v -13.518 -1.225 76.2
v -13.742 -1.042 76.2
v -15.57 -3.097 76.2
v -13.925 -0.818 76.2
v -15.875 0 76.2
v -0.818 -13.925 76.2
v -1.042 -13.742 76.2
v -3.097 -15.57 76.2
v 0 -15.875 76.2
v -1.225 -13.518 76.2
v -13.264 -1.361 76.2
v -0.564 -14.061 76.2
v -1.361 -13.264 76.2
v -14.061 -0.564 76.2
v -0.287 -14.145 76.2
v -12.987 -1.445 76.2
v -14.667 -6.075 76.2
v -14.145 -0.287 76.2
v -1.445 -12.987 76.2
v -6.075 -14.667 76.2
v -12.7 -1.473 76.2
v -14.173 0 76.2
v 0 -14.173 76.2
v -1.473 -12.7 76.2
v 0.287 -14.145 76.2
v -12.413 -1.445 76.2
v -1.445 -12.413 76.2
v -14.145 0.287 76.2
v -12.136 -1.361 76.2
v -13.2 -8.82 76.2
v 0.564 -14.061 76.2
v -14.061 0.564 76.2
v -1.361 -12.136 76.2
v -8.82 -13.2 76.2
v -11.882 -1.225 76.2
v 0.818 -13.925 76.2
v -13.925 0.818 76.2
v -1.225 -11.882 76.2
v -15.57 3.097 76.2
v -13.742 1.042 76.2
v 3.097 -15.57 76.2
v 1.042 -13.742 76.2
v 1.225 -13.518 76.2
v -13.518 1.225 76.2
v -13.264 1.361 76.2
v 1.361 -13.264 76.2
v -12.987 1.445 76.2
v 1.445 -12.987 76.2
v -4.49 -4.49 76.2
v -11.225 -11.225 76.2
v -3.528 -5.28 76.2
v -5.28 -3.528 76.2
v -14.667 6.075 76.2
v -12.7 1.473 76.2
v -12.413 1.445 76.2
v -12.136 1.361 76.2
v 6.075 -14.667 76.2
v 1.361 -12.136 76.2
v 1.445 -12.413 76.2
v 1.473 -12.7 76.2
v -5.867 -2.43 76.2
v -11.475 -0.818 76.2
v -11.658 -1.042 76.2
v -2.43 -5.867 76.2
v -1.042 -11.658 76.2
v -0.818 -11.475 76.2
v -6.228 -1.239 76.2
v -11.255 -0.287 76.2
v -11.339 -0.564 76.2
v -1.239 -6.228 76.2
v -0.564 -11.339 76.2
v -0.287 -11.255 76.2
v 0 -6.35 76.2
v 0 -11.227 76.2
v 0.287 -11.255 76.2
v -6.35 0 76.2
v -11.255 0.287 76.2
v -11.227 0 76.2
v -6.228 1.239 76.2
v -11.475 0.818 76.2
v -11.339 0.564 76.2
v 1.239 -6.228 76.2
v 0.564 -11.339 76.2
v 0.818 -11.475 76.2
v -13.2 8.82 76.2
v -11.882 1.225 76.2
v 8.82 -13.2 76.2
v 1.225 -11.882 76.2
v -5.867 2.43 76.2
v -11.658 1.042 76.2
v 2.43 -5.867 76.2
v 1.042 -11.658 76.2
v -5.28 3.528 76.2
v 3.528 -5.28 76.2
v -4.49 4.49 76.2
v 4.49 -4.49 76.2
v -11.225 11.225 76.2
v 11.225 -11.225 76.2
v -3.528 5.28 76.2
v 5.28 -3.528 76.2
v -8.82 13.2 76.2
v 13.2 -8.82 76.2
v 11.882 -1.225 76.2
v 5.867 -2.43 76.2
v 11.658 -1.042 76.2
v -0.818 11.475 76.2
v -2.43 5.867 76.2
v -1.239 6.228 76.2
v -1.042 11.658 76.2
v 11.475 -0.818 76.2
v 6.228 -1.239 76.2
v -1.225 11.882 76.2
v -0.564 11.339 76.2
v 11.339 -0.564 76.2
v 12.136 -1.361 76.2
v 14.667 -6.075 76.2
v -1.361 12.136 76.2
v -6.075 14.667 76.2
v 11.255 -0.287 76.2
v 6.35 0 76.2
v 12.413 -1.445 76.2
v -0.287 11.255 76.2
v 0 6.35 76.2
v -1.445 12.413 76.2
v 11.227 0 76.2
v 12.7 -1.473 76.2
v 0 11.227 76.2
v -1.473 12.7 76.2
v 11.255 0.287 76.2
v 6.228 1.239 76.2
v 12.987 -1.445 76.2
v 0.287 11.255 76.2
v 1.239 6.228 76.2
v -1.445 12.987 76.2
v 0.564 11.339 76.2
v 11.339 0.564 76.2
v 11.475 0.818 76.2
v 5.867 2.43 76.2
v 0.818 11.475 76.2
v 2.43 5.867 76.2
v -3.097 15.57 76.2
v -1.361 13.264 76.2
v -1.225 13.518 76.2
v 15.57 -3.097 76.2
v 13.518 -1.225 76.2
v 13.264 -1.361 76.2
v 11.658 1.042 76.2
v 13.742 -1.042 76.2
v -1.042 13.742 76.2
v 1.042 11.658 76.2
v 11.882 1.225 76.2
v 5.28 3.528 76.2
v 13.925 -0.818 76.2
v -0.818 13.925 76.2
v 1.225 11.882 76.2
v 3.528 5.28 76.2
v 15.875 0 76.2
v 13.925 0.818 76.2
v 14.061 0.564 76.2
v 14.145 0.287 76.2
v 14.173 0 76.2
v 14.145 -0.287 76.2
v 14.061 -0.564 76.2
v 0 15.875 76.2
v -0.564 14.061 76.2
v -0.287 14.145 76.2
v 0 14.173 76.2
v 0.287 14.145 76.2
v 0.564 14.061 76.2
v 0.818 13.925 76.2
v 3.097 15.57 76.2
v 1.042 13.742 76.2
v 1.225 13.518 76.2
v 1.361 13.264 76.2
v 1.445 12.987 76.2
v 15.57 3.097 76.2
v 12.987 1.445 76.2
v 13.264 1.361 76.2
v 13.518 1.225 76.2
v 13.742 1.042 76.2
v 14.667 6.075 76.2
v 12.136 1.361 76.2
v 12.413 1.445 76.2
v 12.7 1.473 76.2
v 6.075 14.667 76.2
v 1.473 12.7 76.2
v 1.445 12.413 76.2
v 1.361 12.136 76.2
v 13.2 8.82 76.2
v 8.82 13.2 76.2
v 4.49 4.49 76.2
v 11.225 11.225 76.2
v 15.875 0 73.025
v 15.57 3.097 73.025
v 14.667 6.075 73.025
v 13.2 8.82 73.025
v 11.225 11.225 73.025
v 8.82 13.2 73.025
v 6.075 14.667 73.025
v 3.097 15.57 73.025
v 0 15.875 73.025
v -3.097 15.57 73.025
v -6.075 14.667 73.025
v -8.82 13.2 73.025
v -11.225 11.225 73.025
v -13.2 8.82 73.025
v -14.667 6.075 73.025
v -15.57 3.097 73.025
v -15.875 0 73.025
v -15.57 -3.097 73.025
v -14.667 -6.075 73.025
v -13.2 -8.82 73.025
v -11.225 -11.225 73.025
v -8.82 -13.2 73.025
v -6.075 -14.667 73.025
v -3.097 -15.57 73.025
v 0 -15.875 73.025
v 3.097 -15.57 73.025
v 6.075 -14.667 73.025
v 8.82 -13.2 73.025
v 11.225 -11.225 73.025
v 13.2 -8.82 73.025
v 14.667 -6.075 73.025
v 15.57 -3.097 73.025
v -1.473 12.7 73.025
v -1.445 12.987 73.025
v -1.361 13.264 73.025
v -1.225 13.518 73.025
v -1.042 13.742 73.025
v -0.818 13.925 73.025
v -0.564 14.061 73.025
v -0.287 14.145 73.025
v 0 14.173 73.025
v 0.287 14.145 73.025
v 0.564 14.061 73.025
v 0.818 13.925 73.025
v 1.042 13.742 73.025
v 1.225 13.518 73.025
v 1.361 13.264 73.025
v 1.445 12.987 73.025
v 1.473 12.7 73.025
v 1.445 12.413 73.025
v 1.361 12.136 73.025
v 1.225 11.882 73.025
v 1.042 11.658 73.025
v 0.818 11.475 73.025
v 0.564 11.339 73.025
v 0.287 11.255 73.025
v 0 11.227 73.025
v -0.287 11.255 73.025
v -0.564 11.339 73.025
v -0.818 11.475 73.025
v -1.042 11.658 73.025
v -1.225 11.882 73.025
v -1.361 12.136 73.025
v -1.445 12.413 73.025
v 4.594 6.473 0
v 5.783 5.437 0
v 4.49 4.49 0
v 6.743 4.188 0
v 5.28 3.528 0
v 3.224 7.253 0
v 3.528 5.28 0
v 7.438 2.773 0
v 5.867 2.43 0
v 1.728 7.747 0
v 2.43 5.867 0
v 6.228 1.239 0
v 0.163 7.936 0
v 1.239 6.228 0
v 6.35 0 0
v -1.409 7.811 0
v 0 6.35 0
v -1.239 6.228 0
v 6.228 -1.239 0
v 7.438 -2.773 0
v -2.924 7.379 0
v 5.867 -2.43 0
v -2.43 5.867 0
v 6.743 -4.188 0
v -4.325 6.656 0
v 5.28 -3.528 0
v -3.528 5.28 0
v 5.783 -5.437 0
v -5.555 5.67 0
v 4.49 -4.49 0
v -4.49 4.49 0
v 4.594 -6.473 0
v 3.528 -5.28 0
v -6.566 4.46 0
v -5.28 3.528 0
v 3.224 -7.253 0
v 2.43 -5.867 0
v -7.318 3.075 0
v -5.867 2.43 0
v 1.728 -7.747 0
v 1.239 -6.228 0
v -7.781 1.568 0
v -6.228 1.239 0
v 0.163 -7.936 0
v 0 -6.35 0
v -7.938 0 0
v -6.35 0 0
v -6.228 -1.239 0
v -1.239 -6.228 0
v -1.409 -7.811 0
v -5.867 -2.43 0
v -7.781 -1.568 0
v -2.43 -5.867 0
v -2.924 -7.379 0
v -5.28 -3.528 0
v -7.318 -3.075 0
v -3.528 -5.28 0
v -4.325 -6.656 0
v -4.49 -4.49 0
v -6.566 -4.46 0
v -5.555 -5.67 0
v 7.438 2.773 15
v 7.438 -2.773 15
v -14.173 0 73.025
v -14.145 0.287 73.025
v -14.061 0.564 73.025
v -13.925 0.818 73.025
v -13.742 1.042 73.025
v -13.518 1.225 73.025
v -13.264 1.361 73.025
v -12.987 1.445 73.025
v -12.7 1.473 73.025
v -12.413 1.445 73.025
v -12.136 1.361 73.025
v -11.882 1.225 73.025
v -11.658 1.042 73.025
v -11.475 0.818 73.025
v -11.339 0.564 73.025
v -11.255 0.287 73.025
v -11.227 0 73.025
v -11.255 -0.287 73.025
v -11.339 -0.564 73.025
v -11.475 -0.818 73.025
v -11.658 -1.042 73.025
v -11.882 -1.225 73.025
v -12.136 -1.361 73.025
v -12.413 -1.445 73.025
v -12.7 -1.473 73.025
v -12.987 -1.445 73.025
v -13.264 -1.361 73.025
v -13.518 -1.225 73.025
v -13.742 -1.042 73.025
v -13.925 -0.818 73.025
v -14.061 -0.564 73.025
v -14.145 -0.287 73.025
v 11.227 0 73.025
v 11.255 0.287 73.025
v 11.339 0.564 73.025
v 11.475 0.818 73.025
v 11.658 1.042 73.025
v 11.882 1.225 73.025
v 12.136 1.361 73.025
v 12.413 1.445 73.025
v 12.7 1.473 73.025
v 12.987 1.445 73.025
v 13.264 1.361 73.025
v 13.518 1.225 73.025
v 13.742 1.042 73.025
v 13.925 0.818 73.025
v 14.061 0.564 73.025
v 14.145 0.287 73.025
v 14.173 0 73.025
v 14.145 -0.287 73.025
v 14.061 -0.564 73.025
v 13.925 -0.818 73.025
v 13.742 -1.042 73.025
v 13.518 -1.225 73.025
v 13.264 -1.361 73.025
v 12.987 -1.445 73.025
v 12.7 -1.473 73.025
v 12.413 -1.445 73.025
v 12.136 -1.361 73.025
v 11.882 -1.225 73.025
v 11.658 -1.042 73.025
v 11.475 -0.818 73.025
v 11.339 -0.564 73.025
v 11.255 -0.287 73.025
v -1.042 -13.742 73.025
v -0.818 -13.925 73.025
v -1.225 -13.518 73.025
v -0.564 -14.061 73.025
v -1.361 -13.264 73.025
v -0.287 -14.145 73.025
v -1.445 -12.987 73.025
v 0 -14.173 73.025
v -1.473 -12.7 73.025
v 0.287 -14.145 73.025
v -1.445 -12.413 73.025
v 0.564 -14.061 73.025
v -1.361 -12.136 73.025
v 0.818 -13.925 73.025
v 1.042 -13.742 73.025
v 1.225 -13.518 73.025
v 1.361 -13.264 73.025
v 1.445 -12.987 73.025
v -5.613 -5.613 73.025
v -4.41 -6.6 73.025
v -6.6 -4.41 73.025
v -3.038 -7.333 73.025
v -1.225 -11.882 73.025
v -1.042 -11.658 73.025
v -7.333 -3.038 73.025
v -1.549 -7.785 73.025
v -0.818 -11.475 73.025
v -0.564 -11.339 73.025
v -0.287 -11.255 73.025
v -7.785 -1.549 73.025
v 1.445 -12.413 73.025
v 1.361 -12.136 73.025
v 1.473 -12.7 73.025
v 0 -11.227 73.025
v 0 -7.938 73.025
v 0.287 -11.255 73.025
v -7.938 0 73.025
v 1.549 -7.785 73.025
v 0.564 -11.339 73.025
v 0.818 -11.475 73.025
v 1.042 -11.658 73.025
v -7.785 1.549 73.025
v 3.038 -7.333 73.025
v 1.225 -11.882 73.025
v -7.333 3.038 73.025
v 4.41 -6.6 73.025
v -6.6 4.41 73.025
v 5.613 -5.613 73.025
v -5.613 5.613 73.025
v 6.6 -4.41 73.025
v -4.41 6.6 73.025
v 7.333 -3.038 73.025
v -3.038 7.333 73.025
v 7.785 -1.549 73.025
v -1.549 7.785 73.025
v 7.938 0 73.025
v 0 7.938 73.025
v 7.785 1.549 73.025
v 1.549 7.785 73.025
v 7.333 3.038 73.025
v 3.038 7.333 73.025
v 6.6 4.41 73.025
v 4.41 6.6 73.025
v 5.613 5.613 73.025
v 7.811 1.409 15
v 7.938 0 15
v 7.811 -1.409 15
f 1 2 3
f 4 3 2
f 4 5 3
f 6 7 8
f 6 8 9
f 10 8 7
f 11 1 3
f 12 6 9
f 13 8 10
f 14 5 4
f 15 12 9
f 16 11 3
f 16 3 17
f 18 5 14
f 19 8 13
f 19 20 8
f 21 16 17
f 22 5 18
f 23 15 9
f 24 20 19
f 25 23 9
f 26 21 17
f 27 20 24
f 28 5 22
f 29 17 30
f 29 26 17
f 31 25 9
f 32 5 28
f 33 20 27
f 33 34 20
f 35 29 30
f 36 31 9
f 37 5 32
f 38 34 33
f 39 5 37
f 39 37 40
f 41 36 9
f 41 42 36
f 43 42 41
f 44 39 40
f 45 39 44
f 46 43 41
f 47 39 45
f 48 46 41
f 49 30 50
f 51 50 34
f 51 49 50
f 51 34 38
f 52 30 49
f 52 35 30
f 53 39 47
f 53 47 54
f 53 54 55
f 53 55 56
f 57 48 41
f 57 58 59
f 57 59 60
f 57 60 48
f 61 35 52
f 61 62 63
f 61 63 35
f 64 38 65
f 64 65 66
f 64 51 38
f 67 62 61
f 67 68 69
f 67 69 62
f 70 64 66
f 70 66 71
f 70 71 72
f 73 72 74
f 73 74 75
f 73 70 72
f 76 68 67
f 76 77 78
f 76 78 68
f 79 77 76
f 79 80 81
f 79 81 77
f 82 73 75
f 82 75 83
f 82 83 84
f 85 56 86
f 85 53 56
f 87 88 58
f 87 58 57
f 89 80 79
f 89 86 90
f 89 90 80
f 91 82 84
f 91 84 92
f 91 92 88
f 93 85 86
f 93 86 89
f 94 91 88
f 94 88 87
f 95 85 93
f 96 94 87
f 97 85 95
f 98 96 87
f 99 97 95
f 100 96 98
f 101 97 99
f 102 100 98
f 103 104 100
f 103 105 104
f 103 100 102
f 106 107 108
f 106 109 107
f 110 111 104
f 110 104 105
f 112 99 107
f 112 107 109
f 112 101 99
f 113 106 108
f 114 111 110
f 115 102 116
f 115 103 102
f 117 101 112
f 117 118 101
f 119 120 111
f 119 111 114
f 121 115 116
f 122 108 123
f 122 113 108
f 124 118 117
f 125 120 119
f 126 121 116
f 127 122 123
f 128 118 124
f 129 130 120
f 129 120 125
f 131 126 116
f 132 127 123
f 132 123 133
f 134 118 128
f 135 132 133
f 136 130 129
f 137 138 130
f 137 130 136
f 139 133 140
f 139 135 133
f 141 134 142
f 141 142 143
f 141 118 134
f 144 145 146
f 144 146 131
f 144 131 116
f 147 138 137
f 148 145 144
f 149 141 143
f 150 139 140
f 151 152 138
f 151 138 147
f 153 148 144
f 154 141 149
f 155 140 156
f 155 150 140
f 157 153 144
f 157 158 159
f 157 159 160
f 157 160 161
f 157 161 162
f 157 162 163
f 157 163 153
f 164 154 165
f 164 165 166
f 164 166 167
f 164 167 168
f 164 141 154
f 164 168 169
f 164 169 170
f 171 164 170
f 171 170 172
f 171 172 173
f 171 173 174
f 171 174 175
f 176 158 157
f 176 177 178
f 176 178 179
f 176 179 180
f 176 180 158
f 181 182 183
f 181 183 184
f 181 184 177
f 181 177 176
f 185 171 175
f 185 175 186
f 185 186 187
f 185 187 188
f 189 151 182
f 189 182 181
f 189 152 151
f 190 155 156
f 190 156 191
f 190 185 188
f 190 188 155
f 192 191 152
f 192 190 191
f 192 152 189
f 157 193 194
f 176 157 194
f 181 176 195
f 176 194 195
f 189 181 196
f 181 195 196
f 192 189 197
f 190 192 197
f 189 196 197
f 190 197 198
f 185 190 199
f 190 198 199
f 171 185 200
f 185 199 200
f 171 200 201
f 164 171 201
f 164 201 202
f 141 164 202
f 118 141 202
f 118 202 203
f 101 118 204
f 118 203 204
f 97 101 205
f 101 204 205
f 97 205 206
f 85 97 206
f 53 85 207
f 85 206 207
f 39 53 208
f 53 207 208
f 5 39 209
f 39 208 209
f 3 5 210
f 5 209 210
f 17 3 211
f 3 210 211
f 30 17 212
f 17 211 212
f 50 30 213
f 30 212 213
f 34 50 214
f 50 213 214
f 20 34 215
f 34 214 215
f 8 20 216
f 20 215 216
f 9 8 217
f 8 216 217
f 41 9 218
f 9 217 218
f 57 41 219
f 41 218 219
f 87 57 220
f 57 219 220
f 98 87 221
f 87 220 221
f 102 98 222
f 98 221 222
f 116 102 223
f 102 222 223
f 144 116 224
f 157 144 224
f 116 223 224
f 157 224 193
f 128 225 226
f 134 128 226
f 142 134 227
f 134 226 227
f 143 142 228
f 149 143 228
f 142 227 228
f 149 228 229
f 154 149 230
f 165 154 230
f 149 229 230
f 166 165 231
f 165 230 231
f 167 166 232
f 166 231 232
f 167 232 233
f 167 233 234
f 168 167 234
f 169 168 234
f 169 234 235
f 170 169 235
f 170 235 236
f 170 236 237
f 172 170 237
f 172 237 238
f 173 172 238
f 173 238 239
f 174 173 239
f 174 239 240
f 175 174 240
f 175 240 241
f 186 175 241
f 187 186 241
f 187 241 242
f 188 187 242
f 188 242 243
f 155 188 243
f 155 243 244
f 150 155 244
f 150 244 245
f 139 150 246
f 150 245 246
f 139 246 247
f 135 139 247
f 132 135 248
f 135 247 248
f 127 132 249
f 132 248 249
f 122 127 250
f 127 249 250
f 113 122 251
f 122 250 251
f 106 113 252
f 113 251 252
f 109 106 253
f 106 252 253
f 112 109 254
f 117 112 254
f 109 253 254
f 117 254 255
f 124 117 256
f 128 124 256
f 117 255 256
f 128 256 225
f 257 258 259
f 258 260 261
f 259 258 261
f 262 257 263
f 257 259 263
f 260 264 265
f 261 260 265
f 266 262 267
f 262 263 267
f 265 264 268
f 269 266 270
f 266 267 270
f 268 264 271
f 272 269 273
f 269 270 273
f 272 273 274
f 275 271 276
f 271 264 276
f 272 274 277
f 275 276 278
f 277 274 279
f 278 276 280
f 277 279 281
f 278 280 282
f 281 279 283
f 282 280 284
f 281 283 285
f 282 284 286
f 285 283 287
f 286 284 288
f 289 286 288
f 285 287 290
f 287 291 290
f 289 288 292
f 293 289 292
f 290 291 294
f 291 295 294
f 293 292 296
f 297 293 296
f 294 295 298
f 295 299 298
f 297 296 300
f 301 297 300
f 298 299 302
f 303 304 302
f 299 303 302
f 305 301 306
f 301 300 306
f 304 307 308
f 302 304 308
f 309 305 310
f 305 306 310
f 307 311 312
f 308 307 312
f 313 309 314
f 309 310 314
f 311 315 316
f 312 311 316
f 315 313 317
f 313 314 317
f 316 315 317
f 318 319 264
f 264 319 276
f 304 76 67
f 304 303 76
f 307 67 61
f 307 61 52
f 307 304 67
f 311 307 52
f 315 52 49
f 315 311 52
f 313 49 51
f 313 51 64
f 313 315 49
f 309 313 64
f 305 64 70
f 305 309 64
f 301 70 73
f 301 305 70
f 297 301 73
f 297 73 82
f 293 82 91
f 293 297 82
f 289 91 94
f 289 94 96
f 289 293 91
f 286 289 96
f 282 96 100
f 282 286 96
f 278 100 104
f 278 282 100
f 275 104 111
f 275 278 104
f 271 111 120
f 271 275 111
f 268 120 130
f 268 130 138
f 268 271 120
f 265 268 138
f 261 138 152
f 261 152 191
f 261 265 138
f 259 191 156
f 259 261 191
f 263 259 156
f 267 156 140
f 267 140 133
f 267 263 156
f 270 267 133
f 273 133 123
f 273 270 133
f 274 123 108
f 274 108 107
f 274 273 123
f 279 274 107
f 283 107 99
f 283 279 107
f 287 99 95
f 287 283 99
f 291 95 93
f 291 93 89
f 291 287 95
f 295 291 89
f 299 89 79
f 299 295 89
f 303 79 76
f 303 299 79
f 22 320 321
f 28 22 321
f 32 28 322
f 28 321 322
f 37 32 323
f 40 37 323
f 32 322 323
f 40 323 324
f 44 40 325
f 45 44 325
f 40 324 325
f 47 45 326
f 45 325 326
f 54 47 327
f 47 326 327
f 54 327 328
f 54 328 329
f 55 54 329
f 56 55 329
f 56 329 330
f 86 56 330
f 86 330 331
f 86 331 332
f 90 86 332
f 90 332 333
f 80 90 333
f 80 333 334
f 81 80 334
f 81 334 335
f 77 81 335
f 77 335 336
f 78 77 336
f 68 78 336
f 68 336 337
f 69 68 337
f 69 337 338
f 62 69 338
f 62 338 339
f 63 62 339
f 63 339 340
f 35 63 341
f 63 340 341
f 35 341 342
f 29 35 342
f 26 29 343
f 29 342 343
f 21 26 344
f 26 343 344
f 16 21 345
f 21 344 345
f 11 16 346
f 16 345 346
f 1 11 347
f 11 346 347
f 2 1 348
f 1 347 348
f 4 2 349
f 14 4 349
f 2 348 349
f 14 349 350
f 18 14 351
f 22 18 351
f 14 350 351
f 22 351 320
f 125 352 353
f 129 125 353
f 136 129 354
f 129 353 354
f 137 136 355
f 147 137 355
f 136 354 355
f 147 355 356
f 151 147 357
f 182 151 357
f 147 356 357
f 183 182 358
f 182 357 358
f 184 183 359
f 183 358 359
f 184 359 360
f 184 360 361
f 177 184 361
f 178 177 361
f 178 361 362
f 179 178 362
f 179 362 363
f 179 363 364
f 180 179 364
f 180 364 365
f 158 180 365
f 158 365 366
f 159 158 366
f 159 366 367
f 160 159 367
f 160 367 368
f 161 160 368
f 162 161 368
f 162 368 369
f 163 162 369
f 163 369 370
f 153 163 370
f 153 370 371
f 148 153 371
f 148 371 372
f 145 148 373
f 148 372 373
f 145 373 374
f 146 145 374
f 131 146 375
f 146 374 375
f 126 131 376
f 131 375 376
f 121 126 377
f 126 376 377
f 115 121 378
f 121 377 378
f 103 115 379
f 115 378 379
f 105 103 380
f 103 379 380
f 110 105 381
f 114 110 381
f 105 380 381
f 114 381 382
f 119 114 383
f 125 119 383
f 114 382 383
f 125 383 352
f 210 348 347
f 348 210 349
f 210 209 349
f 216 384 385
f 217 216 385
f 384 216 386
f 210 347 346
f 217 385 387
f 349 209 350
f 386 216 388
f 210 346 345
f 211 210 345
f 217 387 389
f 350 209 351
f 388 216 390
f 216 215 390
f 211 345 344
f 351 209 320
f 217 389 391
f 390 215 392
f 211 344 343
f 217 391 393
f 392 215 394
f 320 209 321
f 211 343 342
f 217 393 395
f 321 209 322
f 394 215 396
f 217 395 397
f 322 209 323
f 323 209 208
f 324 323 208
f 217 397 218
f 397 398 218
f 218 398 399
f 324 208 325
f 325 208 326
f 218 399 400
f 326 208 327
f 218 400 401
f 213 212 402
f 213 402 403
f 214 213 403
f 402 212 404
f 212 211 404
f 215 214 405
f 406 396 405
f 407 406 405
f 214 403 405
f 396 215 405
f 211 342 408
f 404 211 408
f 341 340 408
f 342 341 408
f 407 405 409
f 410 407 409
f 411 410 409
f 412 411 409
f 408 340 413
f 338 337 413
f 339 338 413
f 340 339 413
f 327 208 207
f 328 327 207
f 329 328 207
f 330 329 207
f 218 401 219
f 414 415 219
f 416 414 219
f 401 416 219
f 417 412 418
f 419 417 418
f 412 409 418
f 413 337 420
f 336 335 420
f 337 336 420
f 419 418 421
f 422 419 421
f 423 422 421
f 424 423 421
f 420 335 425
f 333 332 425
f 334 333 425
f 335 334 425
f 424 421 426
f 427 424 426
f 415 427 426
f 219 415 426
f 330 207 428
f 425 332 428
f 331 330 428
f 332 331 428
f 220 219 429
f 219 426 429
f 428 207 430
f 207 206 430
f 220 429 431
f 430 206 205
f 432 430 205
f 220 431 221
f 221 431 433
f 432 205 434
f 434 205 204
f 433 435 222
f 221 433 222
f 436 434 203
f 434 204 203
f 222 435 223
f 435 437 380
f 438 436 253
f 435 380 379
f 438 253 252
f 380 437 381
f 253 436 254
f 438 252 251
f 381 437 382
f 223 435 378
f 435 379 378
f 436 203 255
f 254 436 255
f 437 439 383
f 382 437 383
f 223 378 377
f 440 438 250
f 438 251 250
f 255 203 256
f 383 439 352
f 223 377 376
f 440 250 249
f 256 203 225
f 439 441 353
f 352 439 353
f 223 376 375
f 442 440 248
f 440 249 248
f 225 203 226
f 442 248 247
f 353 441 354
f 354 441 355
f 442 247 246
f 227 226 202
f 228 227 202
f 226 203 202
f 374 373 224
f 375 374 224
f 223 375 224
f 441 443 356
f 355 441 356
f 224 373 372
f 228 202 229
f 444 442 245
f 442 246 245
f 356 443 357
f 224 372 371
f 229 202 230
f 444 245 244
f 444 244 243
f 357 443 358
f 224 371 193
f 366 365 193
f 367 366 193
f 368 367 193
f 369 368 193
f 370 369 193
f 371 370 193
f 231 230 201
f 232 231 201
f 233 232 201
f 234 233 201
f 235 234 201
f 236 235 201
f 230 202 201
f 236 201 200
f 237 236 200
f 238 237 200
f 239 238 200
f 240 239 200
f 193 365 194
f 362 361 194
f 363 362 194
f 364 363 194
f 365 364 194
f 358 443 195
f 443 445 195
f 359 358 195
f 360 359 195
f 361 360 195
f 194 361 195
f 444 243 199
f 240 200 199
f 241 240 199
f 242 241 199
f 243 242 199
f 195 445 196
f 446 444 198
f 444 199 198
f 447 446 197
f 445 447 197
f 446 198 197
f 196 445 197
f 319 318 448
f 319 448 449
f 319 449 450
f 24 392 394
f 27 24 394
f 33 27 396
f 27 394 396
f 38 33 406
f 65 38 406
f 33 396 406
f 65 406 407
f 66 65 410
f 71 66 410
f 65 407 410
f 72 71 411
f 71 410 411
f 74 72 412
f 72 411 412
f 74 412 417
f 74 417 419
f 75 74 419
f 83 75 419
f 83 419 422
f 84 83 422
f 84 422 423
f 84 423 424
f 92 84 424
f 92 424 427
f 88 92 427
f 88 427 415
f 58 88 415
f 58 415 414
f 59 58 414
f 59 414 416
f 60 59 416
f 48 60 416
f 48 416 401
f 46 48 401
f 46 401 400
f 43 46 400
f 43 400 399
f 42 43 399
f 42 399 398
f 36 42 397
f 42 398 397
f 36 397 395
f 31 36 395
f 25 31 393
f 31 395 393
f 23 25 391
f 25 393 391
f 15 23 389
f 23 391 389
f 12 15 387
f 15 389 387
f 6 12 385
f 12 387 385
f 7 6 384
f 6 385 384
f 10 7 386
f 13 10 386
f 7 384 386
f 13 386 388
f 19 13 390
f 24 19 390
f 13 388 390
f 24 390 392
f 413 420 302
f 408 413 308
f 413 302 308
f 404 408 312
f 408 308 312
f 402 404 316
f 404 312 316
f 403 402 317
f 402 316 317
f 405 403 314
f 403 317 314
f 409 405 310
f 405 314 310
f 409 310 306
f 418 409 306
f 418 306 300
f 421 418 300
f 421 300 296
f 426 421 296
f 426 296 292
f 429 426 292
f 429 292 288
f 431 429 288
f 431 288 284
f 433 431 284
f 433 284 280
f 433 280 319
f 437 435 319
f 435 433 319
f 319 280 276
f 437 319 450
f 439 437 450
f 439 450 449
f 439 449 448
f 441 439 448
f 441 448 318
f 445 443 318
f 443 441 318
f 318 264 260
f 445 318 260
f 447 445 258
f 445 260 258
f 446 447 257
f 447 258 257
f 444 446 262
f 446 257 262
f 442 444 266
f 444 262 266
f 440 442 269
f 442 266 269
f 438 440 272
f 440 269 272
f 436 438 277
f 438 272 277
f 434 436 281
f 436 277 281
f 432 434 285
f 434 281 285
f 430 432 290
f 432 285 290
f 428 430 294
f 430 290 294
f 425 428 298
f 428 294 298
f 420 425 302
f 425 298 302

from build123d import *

# Parameters (mm, degrees)
SKETCH1_R                 = 7.9375
SKETCH1_R_2               = 6.35
BOSS_EXTRUDE1_DEPTH       = 76.2
BOSS_EXTRUDE2_START       = -3.175
SKETCH2_R                 = 15.875
SKETCH2_R_2               = 6.35
BOSS_EXTRUDE2_DEPTH       = 3.175
F_4_CLEARANCE_HOLE1_D     = 2.9464
F_4_CLEARANCE_HOLE1_DEPTH = 4
F_4_CLEARANCE_HOLE1_TIP   = 0.885187864
CUT_EXTRUDE1_DEPTH        = 80.43847462
CUT_EXTRUDE1_DEPTH_BACK   = 80.43847462
SKETCH6_W                 = 4.137147463
SKETCH6_H                 = 15


with BuildPart() as part:
    # Sketch1 → Boss-Extrude1 (new body)
    with BuildSketch(Plane.XY):
        with Locations(Location((0, 0, 0), (0, 0, 180))):
            Circle(SKETCH1_R)
        with Locations(Location((0, 0, 0), (0, 0, 180))):
            Circle(SKETCH1_R_2, mode=Mode.SUBTRACT)
    extrude(amount=BOSS_EXTRUDE1_DEPTH)

    # Sketch2 → Boss-Extrude2 (add)
    with BuildSketch(Plane.XY.offset(76.2).offset(BOSS_EXTRUDE2_START)):
        Circle(SKETCH2_R)
        with Locations(Location((0, 0, 0), (0, 0, 180))):
            Circle(SKETCH2_R_2, mode=Mode.SUBTRACT)
    extrude(amount=BOSS_EXTRUDE2_DEPTH)

    # #4 Clearance Hole1
    with Locations(Plane.XY.offset(76.2)):
        with Locations((0, 12.7), (0, -12.7), (12.7, 0), (-12.7, 0)):
            Hole(F_4_CLEARANCE_HOLE1_D / 2, depth=F_4_CLEARANCE_HOLE1_DEPTH)
            with Locations((0, 0, -(F_4_CLEARANCE_HOLE1_DEPTH + F_4_CLEARANCE_HOLE1_TIP / 2))):  # 118° drill point
                Cone(0, F_4_CLEARANCE_HOLE1_D / 2, F_4_CLEARANCE_HOLE1_TIP, mode=Mode.SUBTRACT)

    # Sketch6 → Cut-Extrude1 (cut, two sides: drawn at the far end of the back side and taken through both)
    with BuildSketch(Plane(origin=(0, 0, 0), x_dir=(1, 0, 0), z_dir=(0, 1, 0)).offset(-CUT_EXTRUDE1_DEPTH_BACK)):
        with Locations((9.506073732, -7.5)):
            Rectangle(SKETCH6_W, SKETCH6_H)
    extrude(amount=CUT_EXTRUDE1_DEPTH + CUT_EXTRUDE1_DEPTH_BACK, mode=Mode.SUBTRACT)


solid = part.part
